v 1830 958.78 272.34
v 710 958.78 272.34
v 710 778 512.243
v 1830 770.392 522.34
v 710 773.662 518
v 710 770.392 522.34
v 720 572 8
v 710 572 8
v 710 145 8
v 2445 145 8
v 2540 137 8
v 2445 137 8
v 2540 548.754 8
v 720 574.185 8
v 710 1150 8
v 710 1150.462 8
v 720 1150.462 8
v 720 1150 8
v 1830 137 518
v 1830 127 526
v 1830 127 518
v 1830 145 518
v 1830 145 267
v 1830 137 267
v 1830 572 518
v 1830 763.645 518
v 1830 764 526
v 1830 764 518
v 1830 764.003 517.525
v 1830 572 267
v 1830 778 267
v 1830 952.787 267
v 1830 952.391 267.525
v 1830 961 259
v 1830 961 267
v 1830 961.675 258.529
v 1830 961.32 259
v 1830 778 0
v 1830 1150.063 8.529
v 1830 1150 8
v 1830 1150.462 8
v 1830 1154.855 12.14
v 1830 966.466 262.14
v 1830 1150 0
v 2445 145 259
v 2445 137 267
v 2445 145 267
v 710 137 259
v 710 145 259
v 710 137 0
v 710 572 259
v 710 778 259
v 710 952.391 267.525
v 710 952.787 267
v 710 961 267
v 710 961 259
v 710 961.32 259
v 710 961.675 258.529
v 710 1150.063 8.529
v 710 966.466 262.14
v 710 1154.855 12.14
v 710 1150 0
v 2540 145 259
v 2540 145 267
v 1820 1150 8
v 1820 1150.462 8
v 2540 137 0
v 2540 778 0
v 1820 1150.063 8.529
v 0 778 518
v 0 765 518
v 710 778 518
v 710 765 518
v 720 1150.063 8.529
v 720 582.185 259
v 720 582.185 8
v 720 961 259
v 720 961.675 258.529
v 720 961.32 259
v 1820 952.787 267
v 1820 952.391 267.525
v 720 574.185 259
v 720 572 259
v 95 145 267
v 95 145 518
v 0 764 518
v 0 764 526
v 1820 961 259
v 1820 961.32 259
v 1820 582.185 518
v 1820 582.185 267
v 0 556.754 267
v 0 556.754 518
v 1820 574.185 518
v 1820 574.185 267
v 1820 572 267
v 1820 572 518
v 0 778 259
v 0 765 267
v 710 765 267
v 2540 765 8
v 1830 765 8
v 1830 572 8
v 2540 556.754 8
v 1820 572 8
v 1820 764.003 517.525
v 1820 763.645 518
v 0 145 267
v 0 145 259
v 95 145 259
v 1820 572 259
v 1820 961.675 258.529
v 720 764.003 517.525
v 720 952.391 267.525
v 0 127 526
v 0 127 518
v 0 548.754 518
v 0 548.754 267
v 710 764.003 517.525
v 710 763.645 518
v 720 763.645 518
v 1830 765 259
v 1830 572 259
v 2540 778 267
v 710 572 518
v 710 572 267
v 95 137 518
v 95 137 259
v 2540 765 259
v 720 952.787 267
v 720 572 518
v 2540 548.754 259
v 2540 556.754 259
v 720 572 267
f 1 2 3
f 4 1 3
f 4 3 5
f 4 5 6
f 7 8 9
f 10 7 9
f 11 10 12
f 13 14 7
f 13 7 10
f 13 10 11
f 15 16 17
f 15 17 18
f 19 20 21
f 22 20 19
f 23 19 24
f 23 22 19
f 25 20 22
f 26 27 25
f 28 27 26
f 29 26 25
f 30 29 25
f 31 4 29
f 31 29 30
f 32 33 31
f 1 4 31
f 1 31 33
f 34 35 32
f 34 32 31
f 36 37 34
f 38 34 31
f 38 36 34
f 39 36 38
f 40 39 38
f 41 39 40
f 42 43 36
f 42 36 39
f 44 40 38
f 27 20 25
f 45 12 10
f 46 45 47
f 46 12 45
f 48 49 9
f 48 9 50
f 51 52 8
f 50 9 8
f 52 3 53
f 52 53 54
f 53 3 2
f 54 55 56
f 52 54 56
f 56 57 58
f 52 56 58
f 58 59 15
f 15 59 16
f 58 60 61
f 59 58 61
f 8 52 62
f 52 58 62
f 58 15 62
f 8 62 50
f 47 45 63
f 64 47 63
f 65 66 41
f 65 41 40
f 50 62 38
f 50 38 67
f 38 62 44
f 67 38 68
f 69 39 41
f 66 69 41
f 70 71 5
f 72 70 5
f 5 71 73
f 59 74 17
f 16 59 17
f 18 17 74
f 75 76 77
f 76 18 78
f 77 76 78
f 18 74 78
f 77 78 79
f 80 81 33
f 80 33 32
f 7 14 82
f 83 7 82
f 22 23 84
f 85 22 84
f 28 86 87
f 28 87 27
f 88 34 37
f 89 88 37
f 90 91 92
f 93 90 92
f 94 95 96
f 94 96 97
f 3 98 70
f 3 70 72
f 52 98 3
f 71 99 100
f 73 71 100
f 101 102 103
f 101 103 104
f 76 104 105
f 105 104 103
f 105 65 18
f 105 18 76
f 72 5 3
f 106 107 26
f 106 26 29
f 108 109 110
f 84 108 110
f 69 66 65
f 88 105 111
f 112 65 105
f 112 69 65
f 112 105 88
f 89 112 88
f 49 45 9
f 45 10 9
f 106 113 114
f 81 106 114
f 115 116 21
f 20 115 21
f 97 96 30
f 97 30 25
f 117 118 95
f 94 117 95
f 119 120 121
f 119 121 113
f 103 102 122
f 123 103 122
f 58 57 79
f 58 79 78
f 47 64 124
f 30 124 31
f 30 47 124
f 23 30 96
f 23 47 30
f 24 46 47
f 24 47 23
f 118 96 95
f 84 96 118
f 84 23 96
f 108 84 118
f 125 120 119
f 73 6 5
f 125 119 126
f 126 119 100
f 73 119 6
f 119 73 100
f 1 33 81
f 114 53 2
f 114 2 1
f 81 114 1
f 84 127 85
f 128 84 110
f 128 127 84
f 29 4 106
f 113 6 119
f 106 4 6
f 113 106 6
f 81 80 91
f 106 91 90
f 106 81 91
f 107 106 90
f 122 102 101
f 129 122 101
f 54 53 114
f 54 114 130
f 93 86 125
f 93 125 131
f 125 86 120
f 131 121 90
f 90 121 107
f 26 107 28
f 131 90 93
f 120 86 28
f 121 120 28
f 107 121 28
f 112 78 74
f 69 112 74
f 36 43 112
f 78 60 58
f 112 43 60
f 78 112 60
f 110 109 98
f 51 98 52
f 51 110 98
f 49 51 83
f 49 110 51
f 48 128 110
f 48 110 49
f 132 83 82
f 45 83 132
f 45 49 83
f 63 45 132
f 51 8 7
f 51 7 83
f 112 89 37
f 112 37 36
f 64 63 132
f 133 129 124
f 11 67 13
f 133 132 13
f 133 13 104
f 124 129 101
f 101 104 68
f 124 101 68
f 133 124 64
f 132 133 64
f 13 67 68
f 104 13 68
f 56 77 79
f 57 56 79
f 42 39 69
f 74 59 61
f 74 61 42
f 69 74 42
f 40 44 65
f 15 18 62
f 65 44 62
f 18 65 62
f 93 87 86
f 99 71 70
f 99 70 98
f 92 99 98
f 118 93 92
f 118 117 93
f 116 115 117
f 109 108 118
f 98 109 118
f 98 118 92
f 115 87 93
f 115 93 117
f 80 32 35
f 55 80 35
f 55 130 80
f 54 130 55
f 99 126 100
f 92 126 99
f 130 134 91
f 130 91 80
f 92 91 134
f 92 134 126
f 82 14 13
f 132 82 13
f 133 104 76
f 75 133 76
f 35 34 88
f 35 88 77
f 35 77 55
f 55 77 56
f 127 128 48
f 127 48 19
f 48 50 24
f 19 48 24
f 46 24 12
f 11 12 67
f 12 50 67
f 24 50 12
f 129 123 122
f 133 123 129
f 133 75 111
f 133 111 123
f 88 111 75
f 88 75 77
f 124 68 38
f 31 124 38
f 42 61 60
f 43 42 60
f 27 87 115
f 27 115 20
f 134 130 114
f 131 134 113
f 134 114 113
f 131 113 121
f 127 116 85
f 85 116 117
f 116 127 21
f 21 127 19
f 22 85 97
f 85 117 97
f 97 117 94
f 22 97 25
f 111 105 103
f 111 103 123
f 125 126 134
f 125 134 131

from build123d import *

# Parameters (mm, degrees)
EXTRUDE_1_DEPTH  = 8
EXTRUDE_2_DEPTH  = 8
EXTRUDE_3_DEPTH  = 8
SKETCH_7_W       = 1830
SKETCH_7_H       = 637
EXTRUDE_4_DEPTH  = 8
EXTRUDE_5_DEPTH  = 251
EXTRUDE_6_DEPTH  = 251
SKETCH_13_W      = 710
SKETCH_13_H      = 251
EXTRUDE_7_DEPTH  = 13
EXTRUDE_8_DEPTH  = 10
EXTRUDE_9_DEPTH  = 10
EXTRUDE_10_DEPTH = 1120
EXTRUDE_11_DEPTH = 1120


with BuildPart() as part:
    # ｽｹｯﾁ2 → ﾎﾞｽ - 押し出し1 (new body)
    with BuildSketch(Plane.XY.offset(259)):
        Polygon((0, 145), (2540, 145), (2540, 778), (1830, 778), (1830, 961), (710, 961), (710, 778), (0, 778), align=None)
    extrude(amount=EXTRUDE_1_DEPTH)

    # ｽｹｯﾁ4 → ﾎﾞｽ - 押し出し2 (add)
    with BuildSketch(Plane(origin=(0, 137, 0), x_dir=(1, 0, 0), z_dir=(0, 1, 0))):
        Polygon((95, -259), (710, -259), (710, -8), (2445, -8), (2445, -267), (1830, -267), (1830, -518), (95, -518), align=None)
    extrude(amount=EXTRUDE_2_DEPTH)

    # ｽｹｯﾁ5 → ﾎﾞｽ - 押し出し3 (add)
    with BuildSketch(Plane.XY):
        Polygon((710, 137), (2540, 137), (2540, 778), (1830, 778), (1830, 1150), (710, 1150), align=None)
    extrude(amount=EXTRUDE_3_DEPTH)

    # ｽｹｯﾁ7 → ﾎﾞｽ - 押し出し4 (add)
    with BuildSketch(Plane.XY.offset(518)):
        with Locations((915, 445.5)):
            Rectangle(SKETCH_7_W, SKETCH_7_H)
    extrude(amount=EXTRUDE_4_DEPTH)

    # ｽｹｯﾁ9 → ﾎﾞｽ - 押し出し5 (add)
    with BuildSketch(Plane.XY.offset(8)):
        Polygon((710, 574.32489), (2540, 548.7543), (2540, 556.7543), (710, 582.32489), align=None)
    extrude(amount=EXTRUDE_5_DEPTH)

    # ｽｹｯﾁ11 → ﾎﾞｽ - 押し出し6 (add)
    with BuildSketch(Plane.XY.offset(267)):
        Polygon((0, 548.7543), (1830, 574.32489), (1830, 582.32489), (0, 556.7543), align=None)
    extrude(amount=EXTRUDE_6_DEPTH)

    # ｽｹｯﾁ13 → ﾎﾞｽ - 押し出し7 (add)
    with BuildSketch(Plane(origin=(0, 765, 0), x_dir=(1, 0, 0), z_dir=(0, 1, 0))):
        with Locations((355, -392.5)):
            Rectangle(SKETCH_13_W, SKETCH_13_H)
        with Locations((2185, -133.5)):
            Rectangle(SKETCH_13_W, SKETCH_13_H)
    extrude(amount=EXTRUDE_7_DEPTH)

    # ｽｹｯﾁ15 → ﾎﾞｽ - 押し出し8 (add)
    with BuildSketch(Plane(origin=(710, 0, 0), x_dir=(0, 0, -1), z_dir=(1, 0, 0))):
        Polygon((-8, 572), (-259, 572), (-259, 961.319833243), (-8, 1150.461899818), align=None)
        Polygon((-267, 572), (-518, 572), (-518, 763.64506295), (-267, 952.787129526), align=None)
    extrude(amount=EXTRUDE_8_DEPTH)

    # ｽｹｯﾁ17 → ﾎﾞｽ - 押し出し9 (add)
    with BuildSketch(Plane(origin=(1820, 0, 0), x_dir=(0, 0, -1), z_dir=(1, 0, 0))):
        Polygon((-8, 572), (-259, 572), (-259, 961.319833243), (-8, 1150.461899818), align=None)
        Polygon((-267, 572), (-518, 572), (-518, 763.64506295), (-267, 952.787129526), align=None)
    extrude(amount=EXTRUDE_9_DEPTH)

    # ｽｹｯﾁ18 → ﾎﾞｽ - 押し出し10 (add)
    with BuildSketch(Plane(origin=(710, 0, 0), x_dir=(0, 0, -1), z_dir=(1, 0, 0))):
        Polygon((-12.14, 1154.855), (-262.14, 966.466487474), (-258.529109861, 961.674674414), (-8.529109861, 1150.06318694), align=None)
    extrude(amount=EXTRUDE_10_DEPTH)

    # ｽｹｯﾁ19 → ﾎﾞｽ - 押し出し11 (add)
    with BuildSketch(Plane(origin=(710, 0, 0), x_dir=(0, 0, -1), z_dir=(1, 0, 0))):
        Polygon((-272.34, 958.780236163), (-522.34, 770.391723638), (-517.525479815, 764.002639557), (-267.525479815, 952.391152083), align=None)
    extrude(amount=EXTRUDE_11_DEPTH)


solid = part.part
